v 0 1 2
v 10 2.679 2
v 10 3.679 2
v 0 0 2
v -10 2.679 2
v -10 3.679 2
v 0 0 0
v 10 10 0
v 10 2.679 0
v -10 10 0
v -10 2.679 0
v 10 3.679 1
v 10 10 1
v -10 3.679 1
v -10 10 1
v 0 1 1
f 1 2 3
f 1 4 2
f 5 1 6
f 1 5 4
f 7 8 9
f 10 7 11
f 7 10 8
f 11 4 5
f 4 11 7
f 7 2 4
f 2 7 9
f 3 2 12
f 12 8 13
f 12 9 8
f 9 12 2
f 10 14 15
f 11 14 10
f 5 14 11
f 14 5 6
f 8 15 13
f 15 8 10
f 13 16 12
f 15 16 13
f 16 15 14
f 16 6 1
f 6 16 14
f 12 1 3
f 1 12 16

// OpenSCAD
module forme()
{
difference()
{
translate([0,0,1])cube([20,20,2],center=true);
union()
{
rotate([0,0,120+45]) cube([20,20,2]);
rotate([0,0,-120+45]) cube([20,20,2]);
translate([0,-10,1]) cube([20,20,2],center=true);
}
}
}

difference()
{
forme();
translate([0,1,1]) forme();
}
